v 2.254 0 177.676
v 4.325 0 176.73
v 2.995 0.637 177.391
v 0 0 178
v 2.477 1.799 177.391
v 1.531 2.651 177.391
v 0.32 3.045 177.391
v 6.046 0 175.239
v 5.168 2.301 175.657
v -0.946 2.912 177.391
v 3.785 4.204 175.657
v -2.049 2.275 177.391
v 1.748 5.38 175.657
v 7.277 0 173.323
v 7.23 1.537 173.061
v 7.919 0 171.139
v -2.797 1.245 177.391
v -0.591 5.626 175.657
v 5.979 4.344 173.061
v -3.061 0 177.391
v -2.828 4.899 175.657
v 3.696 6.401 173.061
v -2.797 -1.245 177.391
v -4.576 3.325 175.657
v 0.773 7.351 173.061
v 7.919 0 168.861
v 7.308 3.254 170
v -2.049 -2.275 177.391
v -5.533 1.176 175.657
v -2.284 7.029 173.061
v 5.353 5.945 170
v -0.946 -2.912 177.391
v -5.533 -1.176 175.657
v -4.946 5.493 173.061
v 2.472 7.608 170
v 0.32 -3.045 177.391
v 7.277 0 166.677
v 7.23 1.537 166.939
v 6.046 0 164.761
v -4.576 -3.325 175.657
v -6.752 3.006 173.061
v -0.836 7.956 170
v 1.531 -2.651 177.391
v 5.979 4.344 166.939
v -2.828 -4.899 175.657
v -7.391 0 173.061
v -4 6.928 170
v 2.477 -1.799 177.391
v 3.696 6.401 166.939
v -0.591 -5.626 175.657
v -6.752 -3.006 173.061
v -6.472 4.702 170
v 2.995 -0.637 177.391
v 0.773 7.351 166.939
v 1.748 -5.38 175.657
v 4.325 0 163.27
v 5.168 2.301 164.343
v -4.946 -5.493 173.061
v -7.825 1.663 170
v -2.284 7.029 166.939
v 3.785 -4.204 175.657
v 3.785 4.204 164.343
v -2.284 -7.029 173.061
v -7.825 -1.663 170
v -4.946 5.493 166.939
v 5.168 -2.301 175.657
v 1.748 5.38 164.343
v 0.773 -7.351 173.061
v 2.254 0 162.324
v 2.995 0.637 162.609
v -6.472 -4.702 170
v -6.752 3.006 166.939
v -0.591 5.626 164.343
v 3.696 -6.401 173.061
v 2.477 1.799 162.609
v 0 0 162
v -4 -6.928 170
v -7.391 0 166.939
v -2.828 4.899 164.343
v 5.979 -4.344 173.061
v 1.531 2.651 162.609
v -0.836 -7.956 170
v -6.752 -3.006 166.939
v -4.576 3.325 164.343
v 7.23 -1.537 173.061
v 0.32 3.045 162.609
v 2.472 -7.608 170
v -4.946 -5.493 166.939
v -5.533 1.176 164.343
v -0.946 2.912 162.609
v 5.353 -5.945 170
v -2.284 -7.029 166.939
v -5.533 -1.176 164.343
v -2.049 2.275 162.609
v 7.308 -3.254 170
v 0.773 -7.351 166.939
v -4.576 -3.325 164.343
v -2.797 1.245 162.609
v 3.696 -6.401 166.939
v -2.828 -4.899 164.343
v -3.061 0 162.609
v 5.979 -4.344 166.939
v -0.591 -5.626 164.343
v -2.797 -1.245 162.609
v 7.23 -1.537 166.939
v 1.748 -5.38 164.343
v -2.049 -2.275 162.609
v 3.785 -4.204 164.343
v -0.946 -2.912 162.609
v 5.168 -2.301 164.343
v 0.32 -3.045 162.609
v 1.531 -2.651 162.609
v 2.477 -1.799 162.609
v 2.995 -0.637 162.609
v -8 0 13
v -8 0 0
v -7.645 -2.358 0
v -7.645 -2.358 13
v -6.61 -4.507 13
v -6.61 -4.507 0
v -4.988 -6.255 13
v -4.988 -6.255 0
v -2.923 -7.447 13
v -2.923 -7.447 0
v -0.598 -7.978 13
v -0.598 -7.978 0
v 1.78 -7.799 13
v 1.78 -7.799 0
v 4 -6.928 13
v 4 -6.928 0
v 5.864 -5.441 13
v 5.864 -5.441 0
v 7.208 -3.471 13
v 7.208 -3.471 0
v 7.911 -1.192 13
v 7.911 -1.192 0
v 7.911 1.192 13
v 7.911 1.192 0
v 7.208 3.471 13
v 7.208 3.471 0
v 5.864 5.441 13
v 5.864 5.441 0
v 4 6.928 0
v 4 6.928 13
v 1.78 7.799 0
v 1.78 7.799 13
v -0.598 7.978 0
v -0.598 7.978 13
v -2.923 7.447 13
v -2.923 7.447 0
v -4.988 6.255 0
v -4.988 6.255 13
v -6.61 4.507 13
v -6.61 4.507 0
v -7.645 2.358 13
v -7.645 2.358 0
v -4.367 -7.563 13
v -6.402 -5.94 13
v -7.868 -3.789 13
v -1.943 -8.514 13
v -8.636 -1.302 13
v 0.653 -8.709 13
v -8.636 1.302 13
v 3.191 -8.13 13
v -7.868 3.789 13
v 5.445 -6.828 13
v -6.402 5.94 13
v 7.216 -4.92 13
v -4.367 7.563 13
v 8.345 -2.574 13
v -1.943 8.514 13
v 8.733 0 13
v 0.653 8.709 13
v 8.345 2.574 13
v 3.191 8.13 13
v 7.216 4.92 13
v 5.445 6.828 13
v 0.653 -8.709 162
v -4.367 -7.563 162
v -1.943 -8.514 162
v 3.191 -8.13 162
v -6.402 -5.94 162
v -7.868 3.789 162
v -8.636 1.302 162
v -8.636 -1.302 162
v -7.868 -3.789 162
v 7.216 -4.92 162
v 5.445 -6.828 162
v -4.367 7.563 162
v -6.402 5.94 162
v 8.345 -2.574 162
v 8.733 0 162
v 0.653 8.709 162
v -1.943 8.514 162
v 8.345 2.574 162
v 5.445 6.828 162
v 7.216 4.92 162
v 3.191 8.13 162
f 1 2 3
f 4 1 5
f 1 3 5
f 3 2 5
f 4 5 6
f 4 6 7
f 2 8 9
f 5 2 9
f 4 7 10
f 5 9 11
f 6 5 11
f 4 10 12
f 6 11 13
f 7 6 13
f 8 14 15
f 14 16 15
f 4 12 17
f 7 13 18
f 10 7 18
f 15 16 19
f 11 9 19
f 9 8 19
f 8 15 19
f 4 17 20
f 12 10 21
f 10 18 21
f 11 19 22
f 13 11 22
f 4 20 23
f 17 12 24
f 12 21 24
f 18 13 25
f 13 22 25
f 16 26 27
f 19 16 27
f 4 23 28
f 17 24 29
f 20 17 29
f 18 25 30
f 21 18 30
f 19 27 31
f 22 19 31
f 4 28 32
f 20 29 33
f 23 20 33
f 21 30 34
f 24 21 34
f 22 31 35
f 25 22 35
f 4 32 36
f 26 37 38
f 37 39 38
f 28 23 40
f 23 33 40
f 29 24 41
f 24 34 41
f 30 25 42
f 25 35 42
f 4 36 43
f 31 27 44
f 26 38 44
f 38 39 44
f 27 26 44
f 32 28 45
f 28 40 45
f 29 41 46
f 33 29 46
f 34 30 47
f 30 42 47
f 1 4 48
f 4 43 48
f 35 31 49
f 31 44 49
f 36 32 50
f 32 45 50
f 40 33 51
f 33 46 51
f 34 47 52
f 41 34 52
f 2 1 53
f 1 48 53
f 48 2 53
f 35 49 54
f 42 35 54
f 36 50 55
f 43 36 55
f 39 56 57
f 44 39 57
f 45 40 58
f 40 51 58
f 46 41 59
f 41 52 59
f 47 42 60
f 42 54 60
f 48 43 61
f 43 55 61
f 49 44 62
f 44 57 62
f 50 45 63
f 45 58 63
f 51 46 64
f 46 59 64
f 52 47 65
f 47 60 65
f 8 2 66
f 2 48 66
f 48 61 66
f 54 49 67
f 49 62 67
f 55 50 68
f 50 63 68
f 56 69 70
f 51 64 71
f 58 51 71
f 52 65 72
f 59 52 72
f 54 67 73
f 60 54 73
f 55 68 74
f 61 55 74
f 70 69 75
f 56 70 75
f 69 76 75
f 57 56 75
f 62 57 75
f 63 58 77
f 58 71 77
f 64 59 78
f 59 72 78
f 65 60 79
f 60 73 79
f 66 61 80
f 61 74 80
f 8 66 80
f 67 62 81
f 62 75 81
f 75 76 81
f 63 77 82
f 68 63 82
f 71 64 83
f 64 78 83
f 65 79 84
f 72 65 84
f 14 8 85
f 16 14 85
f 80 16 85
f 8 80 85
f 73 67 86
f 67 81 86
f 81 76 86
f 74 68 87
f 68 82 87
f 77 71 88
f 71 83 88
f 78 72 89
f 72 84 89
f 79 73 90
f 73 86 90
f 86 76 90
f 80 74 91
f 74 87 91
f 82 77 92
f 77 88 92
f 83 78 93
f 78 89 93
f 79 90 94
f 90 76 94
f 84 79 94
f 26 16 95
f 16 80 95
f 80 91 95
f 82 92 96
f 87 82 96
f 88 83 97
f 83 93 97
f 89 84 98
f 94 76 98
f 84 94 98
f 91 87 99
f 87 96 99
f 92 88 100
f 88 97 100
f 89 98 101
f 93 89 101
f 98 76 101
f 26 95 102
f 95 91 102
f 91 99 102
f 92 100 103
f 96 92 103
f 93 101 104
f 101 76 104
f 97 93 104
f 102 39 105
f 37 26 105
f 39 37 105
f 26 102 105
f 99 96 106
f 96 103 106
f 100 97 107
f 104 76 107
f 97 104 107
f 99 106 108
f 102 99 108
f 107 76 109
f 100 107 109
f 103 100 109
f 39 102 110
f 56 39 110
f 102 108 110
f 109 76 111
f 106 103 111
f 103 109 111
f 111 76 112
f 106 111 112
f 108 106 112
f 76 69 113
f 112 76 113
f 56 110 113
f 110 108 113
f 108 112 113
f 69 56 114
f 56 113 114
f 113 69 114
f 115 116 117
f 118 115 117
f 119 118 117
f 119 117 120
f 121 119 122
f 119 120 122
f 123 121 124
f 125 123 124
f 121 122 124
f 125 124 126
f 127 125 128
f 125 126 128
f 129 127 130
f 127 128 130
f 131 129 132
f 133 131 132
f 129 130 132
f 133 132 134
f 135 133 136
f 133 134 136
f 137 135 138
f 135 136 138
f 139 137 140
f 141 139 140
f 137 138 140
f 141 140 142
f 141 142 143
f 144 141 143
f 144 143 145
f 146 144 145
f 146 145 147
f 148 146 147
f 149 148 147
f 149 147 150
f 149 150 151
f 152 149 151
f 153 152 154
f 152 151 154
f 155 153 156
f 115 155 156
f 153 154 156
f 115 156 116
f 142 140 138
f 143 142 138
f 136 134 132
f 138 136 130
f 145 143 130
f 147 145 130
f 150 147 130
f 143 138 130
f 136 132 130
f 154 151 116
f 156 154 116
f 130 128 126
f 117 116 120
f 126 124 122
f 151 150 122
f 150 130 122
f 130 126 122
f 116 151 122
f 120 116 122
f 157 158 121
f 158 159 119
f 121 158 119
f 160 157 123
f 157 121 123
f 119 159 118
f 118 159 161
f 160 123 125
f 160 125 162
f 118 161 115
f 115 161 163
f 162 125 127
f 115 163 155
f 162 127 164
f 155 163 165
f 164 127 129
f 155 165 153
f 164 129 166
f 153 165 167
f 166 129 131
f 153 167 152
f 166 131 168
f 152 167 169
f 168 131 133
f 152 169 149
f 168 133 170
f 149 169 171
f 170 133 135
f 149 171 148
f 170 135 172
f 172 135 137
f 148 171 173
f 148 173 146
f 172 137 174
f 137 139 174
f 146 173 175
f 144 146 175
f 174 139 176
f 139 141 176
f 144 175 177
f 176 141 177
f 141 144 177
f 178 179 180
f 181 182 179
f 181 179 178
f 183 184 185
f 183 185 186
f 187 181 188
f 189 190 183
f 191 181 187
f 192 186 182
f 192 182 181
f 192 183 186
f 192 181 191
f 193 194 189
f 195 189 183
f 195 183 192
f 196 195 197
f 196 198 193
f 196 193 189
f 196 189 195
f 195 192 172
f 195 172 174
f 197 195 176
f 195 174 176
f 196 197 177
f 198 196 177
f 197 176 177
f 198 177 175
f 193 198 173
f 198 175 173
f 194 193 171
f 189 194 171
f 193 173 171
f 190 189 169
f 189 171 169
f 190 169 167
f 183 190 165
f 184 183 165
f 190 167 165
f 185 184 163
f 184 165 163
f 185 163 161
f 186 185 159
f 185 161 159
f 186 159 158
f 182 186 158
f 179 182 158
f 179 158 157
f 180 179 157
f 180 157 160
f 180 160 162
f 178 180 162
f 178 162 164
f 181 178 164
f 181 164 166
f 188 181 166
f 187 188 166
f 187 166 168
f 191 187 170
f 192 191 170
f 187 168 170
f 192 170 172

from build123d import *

# Parameters (mm, degrees)
SKETCH1_R           = 8
BOSS_EXTRUDE1_DEPTH = 13
SKETCH2_R           = 8.733340629
BOSS_EXTRUDE2_DEPTH = 149


with BuildPart() as part:
    # Sketch1 → Boss-Extrude1 (new body)
    with BuildSketch(Plane.XY):
        with Locations(Location((0, 0, 0), (0, 0, 180))):
            Circle(SKETCH1_R)
    extrude(amount=BOSS_EXTRUDE1_DEPTH)

    # Sketch2 → Boss-Extrude2 (add)
    with BuildSketch(Plane.XY.offset(13)):
        Circle(SKETCH2_R)
    extrude(amount=BOSS_EXTRUDE2_DEPTH)


with BuildPart() as body_2:
    # Sketch3 → Revolve1 (revolve)
    with BuildSketch(Plane(origin=(0, 0, 0), x_dir=(1, 0, 0), z_dir=(0, 1, 0))):
        with BuildLine():
            Line((0, -162), (0, -178))
            ThreePointArc((0, -178), (8, -170), (0, -162))
        make_face()
    revolve(axis=Axis((0, 0, 162), (0, 0, 1)))


solid = Compound([part.part, body_2.part])
